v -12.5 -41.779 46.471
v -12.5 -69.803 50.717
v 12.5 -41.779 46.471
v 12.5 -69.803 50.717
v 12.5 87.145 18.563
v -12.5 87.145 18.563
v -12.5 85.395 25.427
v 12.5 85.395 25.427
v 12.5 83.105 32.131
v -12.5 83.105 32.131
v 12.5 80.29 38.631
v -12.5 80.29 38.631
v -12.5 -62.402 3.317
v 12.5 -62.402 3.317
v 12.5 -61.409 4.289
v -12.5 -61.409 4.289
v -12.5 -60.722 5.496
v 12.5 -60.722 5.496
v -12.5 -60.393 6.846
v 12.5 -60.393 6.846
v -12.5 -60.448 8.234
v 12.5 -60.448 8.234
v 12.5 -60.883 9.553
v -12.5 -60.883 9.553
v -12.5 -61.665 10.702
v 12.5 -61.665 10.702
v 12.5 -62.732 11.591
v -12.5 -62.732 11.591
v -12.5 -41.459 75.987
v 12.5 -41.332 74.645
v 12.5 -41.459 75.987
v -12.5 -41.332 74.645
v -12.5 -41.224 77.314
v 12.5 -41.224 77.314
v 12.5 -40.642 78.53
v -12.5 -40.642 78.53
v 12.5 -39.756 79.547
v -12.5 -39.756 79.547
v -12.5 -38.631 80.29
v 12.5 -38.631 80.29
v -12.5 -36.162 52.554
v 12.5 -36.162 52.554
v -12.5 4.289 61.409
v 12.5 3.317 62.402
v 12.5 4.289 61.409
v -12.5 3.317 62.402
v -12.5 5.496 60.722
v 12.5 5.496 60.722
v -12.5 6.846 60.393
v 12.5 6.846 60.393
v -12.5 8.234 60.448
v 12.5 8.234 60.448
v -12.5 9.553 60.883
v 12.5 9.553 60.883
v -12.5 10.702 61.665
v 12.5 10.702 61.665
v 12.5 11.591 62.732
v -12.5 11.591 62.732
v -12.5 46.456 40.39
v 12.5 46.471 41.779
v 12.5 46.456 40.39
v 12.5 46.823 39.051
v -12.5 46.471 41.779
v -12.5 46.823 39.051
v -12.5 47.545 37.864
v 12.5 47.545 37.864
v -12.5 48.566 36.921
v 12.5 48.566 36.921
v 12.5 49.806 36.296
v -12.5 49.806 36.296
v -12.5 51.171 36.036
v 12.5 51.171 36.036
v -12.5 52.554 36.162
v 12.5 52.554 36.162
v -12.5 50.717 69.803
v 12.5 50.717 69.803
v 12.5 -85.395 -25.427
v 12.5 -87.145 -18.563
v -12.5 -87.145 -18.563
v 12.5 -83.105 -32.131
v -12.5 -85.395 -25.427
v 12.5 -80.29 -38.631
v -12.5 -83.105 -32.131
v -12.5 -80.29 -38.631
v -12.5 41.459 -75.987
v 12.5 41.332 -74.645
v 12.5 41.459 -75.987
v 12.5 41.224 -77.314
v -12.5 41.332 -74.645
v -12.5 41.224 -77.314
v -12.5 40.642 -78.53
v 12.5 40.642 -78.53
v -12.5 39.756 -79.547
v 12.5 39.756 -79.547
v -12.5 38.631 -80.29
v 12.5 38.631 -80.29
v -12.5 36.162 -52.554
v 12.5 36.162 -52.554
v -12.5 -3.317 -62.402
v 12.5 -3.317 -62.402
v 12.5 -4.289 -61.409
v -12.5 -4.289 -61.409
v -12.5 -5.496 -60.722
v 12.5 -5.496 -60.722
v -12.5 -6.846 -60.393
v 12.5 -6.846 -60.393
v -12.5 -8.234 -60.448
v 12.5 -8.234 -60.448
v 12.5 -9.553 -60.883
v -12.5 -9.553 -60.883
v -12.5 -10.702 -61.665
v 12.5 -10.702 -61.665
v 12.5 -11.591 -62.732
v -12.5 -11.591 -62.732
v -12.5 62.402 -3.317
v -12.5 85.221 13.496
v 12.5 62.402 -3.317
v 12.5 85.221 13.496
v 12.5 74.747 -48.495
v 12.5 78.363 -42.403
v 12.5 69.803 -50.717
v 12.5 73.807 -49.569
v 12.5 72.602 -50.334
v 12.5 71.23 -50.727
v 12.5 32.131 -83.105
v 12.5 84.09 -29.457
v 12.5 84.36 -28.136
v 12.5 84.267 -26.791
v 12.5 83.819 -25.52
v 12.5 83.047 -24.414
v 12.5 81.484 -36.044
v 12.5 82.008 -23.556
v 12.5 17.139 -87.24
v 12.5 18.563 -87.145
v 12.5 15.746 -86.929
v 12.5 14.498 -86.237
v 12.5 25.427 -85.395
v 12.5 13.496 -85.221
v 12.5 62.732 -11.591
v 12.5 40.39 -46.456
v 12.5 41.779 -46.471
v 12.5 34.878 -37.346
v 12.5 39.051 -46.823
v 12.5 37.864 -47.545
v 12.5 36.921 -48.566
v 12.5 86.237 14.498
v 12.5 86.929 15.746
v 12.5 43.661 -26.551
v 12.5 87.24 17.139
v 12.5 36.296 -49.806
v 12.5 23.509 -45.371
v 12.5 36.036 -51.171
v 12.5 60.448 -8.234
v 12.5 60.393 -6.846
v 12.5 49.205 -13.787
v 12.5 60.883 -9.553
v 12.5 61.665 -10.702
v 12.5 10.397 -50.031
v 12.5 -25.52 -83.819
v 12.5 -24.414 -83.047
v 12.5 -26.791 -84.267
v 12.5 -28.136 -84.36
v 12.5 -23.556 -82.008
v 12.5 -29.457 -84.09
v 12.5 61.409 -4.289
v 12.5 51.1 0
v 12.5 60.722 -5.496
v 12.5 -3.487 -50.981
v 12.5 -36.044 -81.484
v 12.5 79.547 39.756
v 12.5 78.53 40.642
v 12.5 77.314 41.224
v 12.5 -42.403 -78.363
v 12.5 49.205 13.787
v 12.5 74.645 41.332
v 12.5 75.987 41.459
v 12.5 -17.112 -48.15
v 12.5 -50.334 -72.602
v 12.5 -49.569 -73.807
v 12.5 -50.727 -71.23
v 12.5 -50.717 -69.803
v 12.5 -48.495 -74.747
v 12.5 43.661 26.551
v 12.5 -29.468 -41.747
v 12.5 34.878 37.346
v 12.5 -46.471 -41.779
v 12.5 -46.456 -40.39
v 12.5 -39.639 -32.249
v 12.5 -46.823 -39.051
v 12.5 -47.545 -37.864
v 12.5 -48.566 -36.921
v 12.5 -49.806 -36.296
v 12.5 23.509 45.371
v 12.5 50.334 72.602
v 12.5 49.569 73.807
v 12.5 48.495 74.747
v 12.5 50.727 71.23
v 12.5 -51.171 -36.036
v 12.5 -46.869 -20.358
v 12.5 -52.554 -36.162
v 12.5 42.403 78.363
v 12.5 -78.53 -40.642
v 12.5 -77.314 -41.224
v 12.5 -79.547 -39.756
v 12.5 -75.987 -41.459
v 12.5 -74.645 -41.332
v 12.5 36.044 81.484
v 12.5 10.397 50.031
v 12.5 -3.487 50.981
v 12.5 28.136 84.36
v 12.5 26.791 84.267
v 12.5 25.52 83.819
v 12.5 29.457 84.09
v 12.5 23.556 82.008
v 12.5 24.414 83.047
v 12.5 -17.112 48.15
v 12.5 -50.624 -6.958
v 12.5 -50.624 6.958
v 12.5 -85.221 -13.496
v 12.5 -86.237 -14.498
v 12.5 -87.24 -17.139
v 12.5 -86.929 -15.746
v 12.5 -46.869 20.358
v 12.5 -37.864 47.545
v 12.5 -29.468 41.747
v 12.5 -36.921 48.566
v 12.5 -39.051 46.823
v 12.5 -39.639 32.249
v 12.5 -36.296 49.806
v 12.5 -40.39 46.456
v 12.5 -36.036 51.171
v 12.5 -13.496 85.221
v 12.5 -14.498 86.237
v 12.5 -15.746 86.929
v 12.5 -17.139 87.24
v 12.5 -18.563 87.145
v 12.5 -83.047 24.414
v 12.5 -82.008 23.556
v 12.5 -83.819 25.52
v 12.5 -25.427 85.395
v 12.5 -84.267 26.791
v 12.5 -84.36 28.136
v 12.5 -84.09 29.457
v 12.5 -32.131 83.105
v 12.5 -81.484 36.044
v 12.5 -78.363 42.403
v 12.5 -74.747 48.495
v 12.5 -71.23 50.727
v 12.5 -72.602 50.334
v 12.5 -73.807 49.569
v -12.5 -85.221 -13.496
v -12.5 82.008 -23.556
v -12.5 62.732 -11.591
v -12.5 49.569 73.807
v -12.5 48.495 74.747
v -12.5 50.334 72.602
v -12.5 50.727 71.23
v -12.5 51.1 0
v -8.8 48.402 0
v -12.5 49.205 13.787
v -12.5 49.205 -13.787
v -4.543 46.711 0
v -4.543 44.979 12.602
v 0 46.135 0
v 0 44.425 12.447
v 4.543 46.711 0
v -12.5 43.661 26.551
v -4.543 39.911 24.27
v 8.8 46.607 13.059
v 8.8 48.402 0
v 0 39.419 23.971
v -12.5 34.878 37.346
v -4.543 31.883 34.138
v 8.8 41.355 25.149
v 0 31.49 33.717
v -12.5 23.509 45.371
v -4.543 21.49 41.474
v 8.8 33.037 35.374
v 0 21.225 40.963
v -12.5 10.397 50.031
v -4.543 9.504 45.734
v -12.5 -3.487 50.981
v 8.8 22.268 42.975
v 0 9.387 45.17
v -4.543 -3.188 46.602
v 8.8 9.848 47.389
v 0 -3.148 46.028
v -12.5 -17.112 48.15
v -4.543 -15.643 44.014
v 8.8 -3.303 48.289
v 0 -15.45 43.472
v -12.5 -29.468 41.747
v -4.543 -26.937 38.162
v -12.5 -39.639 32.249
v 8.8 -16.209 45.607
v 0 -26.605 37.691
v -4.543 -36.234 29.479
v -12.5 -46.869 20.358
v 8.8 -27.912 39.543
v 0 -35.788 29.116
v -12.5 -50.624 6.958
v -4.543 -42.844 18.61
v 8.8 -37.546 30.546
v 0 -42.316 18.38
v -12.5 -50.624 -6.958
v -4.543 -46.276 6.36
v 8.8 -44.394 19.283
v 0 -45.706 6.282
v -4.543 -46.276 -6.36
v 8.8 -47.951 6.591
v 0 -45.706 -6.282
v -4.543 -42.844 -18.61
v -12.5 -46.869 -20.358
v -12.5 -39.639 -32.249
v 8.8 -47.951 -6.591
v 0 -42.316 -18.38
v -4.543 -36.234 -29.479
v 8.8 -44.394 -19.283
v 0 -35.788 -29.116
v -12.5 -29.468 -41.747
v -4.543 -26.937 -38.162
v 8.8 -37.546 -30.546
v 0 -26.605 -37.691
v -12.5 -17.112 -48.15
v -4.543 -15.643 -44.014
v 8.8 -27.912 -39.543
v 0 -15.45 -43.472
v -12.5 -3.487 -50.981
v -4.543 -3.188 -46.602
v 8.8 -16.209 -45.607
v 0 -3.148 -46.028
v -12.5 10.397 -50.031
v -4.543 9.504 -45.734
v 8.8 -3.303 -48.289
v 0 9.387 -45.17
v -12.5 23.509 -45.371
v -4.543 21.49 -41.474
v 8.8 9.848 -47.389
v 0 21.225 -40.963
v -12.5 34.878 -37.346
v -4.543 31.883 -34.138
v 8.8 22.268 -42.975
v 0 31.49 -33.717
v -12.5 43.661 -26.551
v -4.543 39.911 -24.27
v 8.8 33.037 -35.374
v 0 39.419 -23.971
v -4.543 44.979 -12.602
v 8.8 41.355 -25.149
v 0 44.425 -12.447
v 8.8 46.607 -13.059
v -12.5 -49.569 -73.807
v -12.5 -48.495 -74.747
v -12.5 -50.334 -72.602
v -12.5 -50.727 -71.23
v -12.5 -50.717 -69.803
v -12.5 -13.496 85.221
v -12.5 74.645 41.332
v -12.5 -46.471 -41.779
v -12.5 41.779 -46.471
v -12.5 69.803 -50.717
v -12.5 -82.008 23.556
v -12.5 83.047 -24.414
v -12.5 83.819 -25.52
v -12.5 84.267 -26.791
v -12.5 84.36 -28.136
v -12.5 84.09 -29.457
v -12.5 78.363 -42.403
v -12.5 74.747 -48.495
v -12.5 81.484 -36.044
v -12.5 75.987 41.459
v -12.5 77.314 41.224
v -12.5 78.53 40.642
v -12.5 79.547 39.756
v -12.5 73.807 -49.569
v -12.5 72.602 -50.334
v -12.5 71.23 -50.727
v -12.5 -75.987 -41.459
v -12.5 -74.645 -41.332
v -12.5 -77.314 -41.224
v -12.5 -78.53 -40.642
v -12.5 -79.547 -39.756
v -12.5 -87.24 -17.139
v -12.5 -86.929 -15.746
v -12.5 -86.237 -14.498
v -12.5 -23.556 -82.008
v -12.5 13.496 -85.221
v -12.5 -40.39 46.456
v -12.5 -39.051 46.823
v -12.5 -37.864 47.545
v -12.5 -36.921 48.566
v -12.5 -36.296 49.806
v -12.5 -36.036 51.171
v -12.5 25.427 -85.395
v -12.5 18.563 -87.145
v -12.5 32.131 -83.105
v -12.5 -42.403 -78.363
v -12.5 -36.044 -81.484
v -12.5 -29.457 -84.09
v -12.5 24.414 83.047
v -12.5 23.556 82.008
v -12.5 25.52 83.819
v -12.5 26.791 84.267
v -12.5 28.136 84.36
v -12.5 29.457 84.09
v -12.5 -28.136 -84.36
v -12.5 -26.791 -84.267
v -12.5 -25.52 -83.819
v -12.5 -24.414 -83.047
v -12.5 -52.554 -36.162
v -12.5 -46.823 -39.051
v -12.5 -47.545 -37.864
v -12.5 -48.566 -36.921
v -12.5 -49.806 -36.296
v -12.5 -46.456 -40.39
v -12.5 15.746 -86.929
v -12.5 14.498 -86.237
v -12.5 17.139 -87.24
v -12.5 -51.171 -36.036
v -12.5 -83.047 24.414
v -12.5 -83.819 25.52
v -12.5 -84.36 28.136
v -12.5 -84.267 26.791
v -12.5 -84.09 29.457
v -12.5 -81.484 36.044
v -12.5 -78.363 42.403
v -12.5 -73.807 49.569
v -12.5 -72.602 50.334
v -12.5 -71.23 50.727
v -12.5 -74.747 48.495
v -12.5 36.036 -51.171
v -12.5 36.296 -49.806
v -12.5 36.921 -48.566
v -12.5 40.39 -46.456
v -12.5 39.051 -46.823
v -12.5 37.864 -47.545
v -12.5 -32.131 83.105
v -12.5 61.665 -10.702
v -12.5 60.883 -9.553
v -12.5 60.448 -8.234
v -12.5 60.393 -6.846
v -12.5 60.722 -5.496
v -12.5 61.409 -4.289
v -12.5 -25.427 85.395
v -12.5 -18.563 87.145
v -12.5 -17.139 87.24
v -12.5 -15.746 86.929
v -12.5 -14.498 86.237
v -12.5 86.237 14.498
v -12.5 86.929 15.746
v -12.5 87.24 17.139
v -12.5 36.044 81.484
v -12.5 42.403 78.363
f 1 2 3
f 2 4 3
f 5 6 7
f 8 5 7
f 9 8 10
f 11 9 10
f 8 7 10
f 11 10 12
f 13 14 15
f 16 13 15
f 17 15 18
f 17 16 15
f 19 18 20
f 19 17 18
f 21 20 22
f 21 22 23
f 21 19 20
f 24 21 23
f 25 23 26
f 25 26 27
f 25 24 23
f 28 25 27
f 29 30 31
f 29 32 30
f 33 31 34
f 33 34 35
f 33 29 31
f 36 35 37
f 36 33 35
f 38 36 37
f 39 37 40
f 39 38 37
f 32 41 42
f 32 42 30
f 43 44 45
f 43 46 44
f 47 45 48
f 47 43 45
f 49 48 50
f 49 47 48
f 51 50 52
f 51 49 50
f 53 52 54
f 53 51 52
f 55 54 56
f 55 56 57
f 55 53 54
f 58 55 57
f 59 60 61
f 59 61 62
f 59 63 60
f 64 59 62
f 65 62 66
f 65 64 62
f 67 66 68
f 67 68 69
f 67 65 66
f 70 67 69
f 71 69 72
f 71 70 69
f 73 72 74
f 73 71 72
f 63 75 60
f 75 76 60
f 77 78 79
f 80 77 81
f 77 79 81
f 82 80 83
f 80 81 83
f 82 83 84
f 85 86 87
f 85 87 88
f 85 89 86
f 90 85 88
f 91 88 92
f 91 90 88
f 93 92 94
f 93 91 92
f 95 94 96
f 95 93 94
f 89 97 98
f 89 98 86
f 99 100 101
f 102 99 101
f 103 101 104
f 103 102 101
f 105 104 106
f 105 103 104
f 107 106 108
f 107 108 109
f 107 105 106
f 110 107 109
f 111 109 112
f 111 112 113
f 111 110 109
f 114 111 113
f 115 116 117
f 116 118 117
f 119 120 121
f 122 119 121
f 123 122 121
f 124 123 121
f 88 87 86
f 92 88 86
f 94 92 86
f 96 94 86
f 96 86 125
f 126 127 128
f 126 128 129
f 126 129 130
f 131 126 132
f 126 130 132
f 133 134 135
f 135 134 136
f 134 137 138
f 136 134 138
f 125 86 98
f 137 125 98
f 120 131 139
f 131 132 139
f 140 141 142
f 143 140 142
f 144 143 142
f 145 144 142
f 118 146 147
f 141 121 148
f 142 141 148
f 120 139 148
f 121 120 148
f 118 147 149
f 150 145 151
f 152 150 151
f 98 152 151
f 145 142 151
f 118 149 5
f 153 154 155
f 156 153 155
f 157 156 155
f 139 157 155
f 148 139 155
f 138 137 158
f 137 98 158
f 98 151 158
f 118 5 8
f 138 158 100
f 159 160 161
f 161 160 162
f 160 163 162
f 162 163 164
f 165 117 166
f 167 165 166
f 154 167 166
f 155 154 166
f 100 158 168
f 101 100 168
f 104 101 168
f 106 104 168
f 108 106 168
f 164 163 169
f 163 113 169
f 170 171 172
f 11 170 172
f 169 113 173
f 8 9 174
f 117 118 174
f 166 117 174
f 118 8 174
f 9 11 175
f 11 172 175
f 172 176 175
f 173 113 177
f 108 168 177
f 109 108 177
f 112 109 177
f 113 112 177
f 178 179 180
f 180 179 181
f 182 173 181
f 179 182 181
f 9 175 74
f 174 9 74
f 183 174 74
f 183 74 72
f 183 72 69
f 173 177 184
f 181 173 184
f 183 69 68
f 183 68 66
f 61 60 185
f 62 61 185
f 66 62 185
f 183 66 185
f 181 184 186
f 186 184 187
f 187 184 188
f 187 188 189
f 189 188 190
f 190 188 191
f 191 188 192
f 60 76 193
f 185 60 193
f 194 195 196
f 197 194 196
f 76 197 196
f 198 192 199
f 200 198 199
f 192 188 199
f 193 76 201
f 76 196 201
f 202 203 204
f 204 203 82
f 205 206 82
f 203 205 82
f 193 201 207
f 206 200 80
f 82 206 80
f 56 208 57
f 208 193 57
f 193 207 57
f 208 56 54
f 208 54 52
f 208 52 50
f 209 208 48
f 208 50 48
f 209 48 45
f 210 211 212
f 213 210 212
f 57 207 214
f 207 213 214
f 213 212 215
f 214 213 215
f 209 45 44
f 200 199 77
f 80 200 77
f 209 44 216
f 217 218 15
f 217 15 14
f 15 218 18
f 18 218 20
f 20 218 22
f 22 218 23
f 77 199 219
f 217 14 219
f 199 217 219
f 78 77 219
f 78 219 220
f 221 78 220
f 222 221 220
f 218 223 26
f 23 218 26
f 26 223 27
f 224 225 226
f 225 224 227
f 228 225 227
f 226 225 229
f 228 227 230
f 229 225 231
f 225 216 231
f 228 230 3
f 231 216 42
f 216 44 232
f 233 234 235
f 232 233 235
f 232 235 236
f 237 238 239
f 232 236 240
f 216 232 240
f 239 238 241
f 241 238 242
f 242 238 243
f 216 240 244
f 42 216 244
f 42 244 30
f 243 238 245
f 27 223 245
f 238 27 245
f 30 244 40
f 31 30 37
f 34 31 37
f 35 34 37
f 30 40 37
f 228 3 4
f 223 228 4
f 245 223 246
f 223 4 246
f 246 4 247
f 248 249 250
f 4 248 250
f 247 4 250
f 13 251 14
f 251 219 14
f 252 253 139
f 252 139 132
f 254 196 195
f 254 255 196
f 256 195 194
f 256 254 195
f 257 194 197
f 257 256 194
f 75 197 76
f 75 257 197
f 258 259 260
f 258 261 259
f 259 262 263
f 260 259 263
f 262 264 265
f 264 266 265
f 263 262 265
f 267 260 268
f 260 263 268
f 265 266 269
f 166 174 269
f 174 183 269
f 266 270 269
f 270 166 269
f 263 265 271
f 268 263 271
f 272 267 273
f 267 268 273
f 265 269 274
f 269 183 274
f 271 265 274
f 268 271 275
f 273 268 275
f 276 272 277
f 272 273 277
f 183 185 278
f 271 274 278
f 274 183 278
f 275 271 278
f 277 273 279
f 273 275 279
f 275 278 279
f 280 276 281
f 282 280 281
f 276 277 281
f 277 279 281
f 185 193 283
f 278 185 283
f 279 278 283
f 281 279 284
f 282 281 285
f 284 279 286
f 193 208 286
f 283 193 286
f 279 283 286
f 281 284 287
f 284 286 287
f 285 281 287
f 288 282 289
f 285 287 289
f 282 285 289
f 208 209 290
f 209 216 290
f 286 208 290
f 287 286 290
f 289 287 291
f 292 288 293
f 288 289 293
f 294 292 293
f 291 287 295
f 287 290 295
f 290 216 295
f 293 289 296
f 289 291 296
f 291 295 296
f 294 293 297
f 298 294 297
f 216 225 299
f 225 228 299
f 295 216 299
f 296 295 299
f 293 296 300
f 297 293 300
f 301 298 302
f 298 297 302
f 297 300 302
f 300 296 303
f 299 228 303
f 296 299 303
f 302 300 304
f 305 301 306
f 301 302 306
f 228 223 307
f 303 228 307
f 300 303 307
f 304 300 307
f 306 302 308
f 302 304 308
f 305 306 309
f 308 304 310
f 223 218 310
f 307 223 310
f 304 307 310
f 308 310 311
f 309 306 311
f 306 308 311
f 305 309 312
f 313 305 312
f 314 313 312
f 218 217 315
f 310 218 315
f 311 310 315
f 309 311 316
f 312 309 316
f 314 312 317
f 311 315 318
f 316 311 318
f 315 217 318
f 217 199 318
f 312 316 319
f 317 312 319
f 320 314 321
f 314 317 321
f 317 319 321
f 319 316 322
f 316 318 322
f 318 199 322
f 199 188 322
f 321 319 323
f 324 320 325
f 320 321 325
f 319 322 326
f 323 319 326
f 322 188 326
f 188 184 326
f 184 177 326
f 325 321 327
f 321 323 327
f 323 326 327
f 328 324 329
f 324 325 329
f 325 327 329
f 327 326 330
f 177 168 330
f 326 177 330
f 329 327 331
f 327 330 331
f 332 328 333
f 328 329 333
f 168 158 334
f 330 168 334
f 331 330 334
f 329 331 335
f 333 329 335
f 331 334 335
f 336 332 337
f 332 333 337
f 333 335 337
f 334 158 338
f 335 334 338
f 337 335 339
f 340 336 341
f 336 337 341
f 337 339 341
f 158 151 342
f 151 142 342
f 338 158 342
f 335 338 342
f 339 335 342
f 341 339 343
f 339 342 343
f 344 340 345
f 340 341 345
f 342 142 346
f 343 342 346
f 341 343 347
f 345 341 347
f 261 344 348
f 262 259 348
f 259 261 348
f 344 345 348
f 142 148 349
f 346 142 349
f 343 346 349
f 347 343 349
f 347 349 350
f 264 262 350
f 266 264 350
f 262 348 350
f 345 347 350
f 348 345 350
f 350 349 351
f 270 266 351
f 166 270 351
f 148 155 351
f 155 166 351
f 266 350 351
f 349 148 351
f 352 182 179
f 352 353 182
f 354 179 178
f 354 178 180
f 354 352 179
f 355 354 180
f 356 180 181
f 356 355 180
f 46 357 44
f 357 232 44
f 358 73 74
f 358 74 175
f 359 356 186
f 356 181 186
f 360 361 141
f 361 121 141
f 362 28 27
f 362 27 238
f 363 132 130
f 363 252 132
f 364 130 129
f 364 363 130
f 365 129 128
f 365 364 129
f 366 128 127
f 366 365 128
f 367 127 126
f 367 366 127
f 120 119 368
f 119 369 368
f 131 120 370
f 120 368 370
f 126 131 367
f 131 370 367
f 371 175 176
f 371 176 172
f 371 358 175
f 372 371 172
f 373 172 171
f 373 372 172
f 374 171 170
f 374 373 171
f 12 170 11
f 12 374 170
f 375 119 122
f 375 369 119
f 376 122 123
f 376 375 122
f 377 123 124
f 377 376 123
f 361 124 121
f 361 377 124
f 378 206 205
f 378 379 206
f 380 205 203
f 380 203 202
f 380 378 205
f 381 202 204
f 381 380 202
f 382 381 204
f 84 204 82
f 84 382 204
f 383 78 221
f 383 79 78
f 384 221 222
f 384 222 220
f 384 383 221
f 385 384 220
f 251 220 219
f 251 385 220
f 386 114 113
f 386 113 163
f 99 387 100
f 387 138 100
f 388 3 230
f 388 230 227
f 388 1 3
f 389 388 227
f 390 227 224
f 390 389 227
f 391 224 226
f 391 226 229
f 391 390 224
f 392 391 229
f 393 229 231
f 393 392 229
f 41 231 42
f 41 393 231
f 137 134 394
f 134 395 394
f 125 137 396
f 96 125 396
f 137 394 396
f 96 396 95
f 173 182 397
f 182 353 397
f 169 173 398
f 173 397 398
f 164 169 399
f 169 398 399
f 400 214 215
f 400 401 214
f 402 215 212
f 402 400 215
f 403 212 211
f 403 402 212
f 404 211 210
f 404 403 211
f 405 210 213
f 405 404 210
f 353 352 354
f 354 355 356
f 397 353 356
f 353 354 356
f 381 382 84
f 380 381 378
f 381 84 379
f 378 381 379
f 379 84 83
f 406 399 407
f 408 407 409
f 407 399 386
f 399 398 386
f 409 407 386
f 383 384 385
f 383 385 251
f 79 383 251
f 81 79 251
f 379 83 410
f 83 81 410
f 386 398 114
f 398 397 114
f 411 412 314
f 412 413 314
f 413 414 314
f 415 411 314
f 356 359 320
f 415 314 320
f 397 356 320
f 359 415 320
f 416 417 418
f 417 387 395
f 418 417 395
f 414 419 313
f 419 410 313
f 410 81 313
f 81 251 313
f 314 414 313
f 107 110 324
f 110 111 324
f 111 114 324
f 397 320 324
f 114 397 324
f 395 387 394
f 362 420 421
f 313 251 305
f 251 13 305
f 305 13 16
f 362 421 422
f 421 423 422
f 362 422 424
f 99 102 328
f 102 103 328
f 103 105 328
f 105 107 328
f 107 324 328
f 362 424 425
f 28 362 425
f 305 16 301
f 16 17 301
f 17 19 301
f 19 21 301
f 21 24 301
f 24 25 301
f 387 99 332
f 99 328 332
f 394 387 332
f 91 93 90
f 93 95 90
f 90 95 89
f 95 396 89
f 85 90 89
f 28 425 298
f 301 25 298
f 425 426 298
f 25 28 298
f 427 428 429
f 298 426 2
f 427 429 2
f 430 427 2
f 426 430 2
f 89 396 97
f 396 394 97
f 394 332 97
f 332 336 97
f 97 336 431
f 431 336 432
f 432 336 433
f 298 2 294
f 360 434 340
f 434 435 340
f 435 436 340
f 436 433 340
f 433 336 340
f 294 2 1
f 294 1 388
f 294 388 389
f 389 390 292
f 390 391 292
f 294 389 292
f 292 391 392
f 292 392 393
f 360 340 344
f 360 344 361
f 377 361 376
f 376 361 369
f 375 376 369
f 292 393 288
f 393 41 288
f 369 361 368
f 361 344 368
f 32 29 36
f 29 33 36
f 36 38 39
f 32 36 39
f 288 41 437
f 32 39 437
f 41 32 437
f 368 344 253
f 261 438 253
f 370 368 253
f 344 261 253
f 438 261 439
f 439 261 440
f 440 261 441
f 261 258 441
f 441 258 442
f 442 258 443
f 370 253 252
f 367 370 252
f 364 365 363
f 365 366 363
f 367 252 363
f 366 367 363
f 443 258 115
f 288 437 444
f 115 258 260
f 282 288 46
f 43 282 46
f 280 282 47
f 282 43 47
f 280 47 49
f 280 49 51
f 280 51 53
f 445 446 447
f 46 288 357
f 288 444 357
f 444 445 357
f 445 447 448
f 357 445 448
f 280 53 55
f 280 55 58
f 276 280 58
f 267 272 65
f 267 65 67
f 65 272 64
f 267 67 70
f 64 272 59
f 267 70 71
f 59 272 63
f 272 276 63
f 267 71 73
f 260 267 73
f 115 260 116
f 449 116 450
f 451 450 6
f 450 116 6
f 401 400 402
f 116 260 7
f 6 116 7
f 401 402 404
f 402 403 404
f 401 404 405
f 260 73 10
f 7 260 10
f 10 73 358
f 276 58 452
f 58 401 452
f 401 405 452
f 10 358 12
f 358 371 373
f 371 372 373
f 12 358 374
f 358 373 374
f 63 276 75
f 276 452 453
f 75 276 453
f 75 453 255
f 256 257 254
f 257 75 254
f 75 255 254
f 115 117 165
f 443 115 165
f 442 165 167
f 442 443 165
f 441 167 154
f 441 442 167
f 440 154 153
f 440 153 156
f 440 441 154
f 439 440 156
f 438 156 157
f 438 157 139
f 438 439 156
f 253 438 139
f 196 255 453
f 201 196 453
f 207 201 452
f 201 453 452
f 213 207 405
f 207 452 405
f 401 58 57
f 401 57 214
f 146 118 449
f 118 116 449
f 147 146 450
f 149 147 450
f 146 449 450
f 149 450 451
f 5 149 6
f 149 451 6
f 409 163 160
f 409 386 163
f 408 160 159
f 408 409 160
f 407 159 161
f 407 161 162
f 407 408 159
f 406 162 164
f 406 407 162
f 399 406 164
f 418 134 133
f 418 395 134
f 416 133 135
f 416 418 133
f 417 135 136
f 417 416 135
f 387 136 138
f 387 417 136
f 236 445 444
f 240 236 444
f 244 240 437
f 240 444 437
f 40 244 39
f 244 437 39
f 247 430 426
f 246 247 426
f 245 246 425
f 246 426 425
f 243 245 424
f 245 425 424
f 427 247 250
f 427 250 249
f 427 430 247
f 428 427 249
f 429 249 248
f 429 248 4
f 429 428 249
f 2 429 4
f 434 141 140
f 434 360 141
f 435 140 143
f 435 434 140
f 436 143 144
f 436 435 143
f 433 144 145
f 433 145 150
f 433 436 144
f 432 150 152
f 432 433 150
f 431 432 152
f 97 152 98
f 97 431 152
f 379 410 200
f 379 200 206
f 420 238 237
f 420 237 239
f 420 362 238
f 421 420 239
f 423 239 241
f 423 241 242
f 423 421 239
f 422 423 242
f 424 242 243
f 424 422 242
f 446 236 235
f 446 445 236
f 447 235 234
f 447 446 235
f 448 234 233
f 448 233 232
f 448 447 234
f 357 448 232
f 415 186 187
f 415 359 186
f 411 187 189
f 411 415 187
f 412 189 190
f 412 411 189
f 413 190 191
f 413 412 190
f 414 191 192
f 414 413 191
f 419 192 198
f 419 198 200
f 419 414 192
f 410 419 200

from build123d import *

# Parameters (mm, degrees)
F4_DEPTH = 60
F5_R     = 5


# Not quite as in the source:
# - a feature names something its author has since deleted; it is built from what else it names


with BuildPart() as f1:
    # F0 (on Top) → F1 (revolve)
    with BuildSketch(Plane.XY):
        with BuildLine():
            Line((-12.5, 89.1), (-12.5, 51.1))
            ThreePointArc((-12.5, 51.1), (0, 46.135443521), (12.5, 51.1))
            Line((12.5, 51.1), (12.5, 89.1))
            Line((12.5, 89.1), (-12.5, 89.1))
        make_face()
    revolve(axis=Axis((4.8881422824, 0, 0), (1, 0, 0)))

    # F3 (on offset) → F4 (cut)
    with BuildSketch(Plane.YZ.offset(15)):
        Polygon((43.1796096184, -82.538823422), (80.155778704, -52.2855824361), (34.4793311693, -45.3649125185), align=None)
        Polygon((-27.8311669827, -88.896356523), (19.707204774, -93.6501845717), (-7.6972683892, -56.4584061503), align=None)
        Polygon((-82.538823422, -43.1796096184), (-52.2855824361, -80.155778704), (-45.3649125185, -34.4793311693), align=None)
        Polygon((-56.4584061503, 7.6972683892), (-88.896356523, 27.8311669827), (-93.6501845717, -19.707204774), align=None)
        Polygon((-43.1796096184, 82.538823422), (-80.155778704, 52.2855824361), (-34.4793311693, 45.3649125185), align=None)
        Polygon((27.8311669827, 88.896356523), (-19.707204774, 93.6501845717), (7.6972683892, 56.4584061503), align=None)
        Polygon((82.538823422, 43.1796096184), (52.2855824361, 80.155778704), (45.3649125185, 34.4793311693), align=None)
        Polygon((88.896356523, -27.8311669827), (93.6501845717, 19.707204774), (56.4584061503, -7.6972683892), align=None)
    extrude(amount=-F4_DEPTH, mode=Mode.SUBTRACT)

    # F5
    f5_edges = [f1.edges().sort_by_distance(p)[0] for p in [
        (0, 87.764267, 15.370212),
        (0, 85.336625, -25.621679),
        (0, 72.92709, -51.190327),
        (0, 78.459369, 42.224844),
        (0, 51.190327, 72.92709),
        (0, 42.224844, -78.459369),
        (0, 15.370212, -87.764267),
        (0, 34.479331, -45.364913),
        (0, 56.458406, -7.697268),
        (0, 45.364913, 34.479331),
        (0, 25.621679, 85.336625),
        (0, 7.697268, 56.458406),
        (0, -15.370212, 87.764267),
        (0, -42.224844, 78.459369),
        (0, -34.479331, 45.364913),
        (0, -72.92709, 51.190327),
        (0, -85.336625, 25.621679),
        (0, -56.458406, 7.697268),
        (0, -87.764267, -15.370212),
        (0, -78.459369, -42.224844),
        (0, -45.364913, -34.479331),
        (0, -51.190327, -72.92709),
        (0, -25.621679, -85.336625),
        (0, -7.697268, -56.458406),
    ]]
    fillet(f5_edges, radius=F5_R)


solid = f1.part
